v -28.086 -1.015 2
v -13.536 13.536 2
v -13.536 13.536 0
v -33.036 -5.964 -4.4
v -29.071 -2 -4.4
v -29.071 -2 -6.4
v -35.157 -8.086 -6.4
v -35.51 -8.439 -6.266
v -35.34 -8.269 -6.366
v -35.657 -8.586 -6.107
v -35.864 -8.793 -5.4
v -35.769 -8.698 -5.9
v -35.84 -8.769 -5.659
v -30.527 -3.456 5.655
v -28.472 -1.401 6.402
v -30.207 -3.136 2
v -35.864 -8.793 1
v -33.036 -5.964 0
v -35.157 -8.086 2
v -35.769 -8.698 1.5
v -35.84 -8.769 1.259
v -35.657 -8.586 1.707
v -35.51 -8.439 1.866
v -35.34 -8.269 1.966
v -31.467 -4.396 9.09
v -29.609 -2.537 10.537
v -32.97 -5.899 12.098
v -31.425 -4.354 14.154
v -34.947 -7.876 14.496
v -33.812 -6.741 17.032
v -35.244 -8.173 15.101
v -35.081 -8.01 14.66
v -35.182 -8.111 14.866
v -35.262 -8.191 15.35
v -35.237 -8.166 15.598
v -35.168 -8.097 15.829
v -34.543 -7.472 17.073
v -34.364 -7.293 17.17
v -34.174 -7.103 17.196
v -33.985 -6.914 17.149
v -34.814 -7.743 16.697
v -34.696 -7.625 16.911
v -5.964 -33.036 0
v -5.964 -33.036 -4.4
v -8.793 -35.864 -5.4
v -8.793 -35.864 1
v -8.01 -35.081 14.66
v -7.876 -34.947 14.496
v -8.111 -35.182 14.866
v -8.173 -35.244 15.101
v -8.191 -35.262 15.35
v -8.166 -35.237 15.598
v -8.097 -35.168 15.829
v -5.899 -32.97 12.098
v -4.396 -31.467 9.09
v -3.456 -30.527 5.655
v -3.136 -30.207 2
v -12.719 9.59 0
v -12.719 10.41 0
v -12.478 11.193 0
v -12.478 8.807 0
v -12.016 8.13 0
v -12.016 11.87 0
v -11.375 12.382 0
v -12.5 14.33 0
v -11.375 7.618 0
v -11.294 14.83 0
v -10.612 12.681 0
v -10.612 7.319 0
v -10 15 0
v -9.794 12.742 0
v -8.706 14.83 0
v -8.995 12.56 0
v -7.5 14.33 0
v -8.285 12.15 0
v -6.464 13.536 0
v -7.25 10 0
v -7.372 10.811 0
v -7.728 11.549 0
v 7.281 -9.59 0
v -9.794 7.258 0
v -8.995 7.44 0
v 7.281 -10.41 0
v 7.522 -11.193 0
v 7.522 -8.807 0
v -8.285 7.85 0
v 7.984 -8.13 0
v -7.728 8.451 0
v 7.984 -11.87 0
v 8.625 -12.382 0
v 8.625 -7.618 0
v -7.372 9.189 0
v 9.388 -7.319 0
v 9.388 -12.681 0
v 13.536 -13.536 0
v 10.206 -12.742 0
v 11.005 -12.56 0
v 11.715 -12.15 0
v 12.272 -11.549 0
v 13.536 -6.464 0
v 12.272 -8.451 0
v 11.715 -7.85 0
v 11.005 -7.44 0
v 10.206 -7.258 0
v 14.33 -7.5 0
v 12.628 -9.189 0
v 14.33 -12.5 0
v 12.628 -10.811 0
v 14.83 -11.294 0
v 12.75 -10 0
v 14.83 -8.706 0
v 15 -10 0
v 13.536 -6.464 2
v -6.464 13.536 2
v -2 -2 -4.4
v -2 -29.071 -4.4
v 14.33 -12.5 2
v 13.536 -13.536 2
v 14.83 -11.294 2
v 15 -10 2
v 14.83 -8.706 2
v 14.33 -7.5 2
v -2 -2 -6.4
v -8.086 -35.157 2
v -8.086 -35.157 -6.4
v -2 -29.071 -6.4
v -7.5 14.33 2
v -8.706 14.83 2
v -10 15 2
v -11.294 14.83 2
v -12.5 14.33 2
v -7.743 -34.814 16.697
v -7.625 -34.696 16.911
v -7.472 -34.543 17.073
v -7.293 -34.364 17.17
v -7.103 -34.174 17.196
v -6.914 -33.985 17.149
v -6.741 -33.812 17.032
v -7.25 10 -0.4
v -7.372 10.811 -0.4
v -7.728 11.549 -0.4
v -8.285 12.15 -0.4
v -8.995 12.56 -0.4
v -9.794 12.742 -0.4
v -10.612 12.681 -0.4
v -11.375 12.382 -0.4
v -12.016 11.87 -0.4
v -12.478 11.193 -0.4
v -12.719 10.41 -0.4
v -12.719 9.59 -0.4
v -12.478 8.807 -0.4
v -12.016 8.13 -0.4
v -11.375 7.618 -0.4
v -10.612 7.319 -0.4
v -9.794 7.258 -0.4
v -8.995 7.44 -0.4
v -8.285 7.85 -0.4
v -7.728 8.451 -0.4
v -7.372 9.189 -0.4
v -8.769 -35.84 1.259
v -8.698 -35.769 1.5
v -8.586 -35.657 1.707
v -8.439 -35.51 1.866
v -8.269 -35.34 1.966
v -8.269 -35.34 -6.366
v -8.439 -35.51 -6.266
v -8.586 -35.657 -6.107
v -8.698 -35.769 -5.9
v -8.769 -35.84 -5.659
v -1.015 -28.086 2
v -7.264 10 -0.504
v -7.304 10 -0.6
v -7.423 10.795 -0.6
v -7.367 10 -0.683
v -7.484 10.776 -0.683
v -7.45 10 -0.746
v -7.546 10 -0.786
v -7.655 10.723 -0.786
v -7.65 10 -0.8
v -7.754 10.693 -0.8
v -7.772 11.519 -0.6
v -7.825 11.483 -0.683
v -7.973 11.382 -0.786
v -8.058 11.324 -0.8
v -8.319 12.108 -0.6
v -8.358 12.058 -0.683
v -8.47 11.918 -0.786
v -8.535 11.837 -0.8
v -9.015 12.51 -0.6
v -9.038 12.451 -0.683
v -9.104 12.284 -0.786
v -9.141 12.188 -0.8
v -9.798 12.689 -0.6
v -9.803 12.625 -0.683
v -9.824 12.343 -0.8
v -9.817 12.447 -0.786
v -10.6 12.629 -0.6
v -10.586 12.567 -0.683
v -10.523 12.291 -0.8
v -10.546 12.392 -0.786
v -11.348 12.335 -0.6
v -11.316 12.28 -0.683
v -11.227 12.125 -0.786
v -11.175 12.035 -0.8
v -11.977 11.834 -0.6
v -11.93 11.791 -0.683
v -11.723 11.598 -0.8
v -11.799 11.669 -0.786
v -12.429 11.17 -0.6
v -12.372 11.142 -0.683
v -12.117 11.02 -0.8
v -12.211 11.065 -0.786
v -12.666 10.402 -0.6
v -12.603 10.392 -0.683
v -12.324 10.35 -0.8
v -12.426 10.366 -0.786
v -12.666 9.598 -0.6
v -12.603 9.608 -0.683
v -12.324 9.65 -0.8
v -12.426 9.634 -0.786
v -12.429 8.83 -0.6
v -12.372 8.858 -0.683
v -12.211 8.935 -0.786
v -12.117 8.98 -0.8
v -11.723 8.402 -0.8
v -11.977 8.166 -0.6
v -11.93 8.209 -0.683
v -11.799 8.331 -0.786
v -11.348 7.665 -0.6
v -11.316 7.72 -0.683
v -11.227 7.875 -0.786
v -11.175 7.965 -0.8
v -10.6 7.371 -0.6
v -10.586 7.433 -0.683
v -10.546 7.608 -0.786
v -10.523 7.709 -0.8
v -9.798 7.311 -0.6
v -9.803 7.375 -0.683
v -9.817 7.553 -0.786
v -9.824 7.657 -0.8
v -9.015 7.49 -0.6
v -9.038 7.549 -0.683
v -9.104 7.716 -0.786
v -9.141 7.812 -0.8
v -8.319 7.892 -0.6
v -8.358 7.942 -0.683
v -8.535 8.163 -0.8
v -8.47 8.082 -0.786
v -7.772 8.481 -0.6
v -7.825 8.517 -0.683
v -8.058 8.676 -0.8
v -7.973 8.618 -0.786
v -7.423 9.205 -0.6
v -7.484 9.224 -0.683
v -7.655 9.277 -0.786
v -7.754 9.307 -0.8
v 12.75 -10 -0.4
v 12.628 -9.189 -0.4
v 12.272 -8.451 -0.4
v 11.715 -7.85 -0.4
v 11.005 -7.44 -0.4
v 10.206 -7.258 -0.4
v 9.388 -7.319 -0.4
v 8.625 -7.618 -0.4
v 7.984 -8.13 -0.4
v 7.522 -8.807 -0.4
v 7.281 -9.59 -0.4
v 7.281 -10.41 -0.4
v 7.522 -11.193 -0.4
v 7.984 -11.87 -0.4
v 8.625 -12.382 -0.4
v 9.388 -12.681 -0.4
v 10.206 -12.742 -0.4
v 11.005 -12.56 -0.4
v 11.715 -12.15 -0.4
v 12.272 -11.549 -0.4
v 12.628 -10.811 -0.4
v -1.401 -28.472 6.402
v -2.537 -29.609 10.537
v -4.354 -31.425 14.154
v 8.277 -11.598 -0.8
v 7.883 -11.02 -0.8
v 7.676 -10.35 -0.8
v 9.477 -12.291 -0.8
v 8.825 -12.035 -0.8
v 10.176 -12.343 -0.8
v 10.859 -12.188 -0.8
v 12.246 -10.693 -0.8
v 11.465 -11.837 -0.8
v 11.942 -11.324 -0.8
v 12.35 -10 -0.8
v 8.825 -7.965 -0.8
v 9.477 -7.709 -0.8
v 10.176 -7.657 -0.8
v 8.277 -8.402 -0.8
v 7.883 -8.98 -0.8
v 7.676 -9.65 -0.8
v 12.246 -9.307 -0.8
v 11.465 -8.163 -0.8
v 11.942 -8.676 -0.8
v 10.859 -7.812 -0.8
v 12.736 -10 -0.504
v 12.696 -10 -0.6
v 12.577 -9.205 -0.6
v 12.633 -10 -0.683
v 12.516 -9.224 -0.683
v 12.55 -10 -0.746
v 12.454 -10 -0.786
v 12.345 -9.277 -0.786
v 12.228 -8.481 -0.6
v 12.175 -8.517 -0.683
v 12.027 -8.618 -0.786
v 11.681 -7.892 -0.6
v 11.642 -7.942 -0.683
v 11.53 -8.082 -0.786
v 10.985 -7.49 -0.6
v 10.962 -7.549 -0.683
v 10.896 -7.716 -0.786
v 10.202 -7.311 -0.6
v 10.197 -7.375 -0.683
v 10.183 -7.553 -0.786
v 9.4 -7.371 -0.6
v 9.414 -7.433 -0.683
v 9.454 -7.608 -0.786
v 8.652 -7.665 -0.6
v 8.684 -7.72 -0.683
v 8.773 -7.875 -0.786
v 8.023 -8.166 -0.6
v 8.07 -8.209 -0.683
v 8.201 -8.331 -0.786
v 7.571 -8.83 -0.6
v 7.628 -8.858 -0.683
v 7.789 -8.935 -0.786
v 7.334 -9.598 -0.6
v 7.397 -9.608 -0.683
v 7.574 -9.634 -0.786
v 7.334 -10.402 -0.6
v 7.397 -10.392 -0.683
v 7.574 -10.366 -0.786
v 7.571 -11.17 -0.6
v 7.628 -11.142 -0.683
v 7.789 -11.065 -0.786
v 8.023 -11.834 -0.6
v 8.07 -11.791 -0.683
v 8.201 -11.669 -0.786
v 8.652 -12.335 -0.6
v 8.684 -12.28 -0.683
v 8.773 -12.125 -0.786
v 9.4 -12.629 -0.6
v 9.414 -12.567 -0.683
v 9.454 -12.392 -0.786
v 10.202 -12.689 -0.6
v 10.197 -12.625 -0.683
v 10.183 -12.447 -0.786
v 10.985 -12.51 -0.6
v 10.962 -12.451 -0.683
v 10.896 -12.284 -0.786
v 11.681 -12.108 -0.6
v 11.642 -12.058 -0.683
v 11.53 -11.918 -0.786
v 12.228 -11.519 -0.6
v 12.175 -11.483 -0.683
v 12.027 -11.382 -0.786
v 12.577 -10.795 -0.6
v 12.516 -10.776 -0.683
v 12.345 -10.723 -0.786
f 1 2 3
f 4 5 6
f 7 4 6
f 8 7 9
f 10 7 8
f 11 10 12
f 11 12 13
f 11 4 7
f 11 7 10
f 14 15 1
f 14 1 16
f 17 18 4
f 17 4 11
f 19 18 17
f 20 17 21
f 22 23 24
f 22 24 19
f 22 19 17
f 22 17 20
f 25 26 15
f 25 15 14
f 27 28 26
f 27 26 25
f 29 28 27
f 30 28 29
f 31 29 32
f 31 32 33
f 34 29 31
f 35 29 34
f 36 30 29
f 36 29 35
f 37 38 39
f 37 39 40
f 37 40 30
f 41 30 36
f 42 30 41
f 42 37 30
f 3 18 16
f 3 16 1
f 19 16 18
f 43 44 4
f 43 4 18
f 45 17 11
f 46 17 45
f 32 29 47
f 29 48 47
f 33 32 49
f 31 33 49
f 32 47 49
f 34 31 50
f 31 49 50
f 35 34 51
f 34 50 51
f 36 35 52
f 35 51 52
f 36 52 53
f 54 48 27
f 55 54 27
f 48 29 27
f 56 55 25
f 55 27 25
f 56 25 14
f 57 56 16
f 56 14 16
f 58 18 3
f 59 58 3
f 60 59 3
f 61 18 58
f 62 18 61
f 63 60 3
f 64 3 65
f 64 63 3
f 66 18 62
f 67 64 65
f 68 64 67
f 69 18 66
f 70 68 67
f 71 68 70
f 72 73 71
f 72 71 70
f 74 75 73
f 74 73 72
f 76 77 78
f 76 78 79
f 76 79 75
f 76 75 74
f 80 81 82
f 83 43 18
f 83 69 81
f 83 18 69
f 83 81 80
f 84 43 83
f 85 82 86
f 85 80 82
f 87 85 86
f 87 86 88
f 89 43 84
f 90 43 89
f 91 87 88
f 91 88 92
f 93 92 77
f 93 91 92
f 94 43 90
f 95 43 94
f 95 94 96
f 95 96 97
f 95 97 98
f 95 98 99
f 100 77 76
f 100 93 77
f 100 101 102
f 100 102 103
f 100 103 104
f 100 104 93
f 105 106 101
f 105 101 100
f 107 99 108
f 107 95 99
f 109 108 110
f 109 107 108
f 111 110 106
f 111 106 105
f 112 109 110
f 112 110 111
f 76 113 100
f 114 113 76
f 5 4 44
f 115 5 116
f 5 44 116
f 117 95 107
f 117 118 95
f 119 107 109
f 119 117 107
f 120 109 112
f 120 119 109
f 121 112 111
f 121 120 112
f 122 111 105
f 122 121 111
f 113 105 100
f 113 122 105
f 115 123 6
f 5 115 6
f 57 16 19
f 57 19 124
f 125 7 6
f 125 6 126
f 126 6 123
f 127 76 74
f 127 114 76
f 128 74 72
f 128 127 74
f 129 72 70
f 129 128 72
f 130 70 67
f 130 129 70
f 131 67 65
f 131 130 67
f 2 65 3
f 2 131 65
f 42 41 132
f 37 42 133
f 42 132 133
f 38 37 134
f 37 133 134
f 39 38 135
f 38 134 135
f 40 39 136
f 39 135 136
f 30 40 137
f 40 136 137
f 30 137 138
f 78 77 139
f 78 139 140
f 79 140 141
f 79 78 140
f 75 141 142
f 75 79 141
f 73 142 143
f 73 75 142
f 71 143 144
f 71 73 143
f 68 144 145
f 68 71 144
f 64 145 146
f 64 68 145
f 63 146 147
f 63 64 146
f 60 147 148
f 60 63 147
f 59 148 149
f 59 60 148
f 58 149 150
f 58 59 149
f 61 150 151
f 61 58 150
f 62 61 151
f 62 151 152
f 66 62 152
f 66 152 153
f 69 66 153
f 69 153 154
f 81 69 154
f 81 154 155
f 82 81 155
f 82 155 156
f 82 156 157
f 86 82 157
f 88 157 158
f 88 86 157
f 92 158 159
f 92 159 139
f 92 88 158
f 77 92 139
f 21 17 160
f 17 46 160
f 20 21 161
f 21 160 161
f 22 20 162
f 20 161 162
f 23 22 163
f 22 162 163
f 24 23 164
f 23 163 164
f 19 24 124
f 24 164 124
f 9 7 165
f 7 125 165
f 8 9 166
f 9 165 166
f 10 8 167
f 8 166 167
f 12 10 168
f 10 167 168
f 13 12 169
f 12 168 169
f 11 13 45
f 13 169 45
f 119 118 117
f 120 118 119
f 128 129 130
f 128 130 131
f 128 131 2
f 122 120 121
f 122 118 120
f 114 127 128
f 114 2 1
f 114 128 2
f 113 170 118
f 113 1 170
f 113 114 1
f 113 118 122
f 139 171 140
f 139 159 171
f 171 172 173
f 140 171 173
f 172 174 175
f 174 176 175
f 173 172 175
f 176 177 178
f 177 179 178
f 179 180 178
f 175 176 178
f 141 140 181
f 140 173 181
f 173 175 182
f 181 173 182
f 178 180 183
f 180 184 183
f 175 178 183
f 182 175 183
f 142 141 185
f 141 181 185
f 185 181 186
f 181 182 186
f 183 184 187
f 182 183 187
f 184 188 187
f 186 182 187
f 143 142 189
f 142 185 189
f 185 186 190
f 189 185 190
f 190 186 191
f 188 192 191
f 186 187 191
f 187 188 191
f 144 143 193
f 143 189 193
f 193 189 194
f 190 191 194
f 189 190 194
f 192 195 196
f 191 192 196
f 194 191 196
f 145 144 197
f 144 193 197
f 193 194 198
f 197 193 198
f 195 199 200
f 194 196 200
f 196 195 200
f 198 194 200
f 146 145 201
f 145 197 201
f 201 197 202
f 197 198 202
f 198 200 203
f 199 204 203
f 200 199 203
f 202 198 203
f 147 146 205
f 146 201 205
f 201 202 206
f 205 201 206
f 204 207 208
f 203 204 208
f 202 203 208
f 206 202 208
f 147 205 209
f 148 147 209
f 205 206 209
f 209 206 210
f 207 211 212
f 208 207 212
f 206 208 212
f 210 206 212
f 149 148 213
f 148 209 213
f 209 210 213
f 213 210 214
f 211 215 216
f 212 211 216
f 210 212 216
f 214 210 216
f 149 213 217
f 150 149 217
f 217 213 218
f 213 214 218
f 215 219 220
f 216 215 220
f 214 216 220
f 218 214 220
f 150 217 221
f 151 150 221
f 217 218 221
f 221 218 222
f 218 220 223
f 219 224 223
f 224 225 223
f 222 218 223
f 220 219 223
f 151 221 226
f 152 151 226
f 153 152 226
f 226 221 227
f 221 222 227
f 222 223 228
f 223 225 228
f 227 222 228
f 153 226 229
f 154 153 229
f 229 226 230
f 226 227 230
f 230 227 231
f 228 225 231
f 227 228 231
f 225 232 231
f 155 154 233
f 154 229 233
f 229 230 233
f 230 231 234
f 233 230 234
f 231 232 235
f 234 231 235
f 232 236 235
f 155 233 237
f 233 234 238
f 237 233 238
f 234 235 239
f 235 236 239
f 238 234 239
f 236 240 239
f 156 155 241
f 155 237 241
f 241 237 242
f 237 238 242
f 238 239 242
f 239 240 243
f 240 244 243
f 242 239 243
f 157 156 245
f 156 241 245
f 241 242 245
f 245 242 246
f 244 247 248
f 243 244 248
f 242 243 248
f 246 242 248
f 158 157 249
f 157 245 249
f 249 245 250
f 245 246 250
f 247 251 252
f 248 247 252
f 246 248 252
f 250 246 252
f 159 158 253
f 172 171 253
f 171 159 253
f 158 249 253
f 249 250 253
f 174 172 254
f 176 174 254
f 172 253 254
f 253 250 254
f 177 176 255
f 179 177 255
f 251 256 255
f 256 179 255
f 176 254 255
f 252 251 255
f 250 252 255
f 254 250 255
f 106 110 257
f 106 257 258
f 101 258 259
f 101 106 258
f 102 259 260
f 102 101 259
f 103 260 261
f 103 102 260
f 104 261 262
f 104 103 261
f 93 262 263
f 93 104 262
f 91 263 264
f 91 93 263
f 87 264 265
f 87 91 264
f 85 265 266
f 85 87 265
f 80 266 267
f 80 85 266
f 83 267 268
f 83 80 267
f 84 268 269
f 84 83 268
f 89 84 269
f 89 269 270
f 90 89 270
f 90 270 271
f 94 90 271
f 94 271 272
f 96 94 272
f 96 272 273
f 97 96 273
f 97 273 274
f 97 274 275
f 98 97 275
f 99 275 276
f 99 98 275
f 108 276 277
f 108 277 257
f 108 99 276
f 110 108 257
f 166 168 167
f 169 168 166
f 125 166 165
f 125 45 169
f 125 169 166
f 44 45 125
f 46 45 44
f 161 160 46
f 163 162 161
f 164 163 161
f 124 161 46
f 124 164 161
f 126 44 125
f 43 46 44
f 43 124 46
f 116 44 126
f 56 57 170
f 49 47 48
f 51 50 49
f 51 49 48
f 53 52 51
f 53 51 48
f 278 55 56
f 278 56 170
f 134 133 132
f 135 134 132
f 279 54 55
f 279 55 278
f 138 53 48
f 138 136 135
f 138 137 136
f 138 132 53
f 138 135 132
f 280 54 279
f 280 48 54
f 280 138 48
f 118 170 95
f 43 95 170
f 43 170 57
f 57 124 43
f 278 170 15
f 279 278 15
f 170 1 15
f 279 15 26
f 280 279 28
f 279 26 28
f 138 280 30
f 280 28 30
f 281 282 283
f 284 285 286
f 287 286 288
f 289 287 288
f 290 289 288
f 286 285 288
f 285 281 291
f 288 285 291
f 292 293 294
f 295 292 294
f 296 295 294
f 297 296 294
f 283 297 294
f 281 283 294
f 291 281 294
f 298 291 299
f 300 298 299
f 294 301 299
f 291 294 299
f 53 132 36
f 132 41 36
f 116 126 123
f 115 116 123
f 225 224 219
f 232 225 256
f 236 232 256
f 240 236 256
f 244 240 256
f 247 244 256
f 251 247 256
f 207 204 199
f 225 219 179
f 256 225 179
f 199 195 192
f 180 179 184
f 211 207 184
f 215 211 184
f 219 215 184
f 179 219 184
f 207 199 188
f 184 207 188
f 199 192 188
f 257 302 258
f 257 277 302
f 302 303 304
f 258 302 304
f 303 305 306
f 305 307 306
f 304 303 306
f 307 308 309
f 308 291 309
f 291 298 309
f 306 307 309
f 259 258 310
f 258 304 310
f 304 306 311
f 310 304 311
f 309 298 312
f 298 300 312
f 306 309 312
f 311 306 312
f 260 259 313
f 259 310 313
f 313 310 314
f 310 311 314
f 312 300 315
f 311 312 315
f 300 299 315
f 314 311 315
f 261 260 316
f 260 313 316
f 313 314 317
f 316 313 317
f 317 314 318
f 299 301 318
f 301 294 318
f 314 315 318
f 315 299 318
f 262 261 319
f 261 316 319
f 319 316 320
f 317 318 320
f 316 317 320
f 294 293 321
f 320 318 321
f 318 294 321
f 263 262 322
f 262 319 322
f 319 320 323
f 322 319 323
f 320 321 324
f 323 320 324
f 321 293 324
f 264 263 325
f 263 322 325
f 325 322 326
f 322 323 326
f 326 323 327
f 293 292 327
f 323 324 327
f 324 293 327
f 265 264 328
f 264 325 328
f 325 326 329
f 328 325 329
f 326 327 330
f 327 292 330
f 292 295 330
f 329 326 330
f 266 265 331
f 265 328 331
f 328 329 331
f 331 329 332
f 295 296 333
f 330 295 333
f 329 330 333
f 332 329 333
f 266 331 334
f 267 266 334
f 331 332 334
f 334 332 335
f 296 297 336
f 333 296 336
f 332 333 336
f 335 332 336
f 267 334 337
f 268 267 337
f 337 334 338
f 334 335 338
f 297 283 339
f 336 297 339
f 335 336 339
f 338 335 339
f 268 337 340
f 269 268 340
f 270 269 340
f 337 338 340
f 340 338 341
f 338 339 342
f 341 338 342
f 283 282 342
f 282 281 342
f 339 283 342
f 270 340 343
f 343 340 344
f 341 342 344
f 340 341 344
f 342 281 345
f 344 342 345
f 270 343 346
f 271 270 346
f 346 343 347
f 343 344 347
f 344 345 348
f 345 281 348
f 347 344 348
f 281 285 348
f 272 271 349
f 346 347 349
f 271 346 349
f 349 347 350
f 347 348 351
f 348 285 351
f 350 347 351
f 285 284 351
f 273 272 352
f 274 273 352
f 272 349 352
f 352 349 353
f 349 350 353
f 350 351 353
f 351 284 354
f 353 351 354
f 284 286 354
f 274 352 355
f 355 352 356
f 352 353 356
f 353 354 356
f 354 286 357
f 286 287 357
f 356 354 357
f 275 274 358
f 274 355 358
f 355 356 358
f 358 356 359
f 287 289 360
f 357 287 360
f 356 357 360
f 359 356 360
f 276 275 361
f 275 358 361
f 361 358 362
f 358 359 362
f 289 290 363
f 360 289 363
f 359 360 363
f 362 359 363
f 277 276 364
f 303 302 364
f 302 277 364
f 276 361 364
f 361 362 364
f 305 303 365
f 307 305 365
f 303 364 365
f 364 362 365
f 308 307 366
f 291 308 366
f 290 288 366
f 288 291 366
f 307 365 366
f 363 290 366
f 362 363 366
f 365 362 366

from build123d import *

# Parameters (mm, degrees)
F2_DEPTH      = 2
F2_DEPTH_BACK = 6.4
F3_W          = 32.5771644663
F3_H          = 4.4
F4_DEPTH      = 56.5738534806
F7_DEPTH      = 19.1421356237
F7_DEPTH_BACK = 19.1421356237
F9_DEPTH      = 2
F0_R          = 2.75
F10_DEPTH     = 0.8
F11_R         = 0.4
F12_R         = 1
F13_R         = 5


with BuildPart() as f2:
    # F1 (on Top) → F2 (new body, two sides)
    with BuildSketch(Plane.XY) as f2_sk:
        Polygon((-8.7928932188, -35.8639610307), (17.0710678119, -10), (-10, 17.0710678119), (-35.8639610307, -8.7928932188), align=None)
    extrude(amount=F2_DEPTH)
    extrude(f2_sk.sketch, amount=-F2_DEPTH_BACK)

    # F3 (on face) → F4 (cut, through all)
    with BuildSketch(Plane(origin=(13.5355339059, -13.5355339059, 0), x_dir=(0.7071067812, 0.7071067812, 0), z_dir=(0.7071067812, -0.7071067812, 0))):
        with Locations((-11.2885822331, -2.2)):
            Rectangle(F3_W, F3_H)
    extrude(amount=-F4_DEPTH, mode=Mode.SUBTRACT)

    # F6 (on face) → F7 (join, two sides)
    with BuildSketch(Plane(origin=(0, 0, 0), x_dir=(0.7071067812, 0.7071067812, 0), z_dir=(0.7071067812, -0.7071067812, 0))) as f7_sk:
        with BuildLine():
            Line((-23.5771644663, 2), (-20.5771644663, 2))
            ThreePointArc((-20.5771644663, 2), (-22.9887071982, 11), (-29.5771644663, 17.5884572681))
            Line((-29.5771644663, 17.5884572681), (-31.0771644663, 14.9903810568))
            ThreePointArc((-31.0771644663, 14.9903810568), (-25.5867834095, 9.5), (-23.5771644663, 2))
        make_face()
    extrude(amount=-F7_DEPTH)
    extrude(f7_sk.sketch, amount=F7_DEPTH_BACK)

    # F8 (on face) → F9 (cut, through all)
    with BuildSketch(Plane(origin=(0, 0, -6.4), x_dir=(1, 0, 0), z_dir=(0, 0, -1))):
        Polygon((17.0710678119, 10), (-2, 29.0710678119), (-2, 2), (-29.0710678119, 2), (-10, -17.0710678119), align=None)
    extrude(amount=-F9_DEPTH, mode=Mode.SUBTRACT)

    # F0 (on Top) → F10 (join)
    with BuildSketch(Plane.XY):
        with Locations((10, -10)):
            Circle(F0_R)
        with Locations((-10, 10)):
            Circle(F0_R)
    extrude(amount=-F10_DEPTH)

    # F11
    f11_edges = [f2.edges().sort_by_distance(p)[0] for p in [
        (7.25, -10, -0.8),
        (-12.75, 10, -0.8),
    ]]
    fillet(f11_edges, radius=F11_R)

    # F12
    f12_edges = [f2.edges().sort_by_distance(p)[0] for p in [
        (-21.974874, -21.974874, 14.990381),
        (-20.914214, -20.914214, 17.588457),
        (-22.328427, -22.328427, 2),
        (-22.328427, -22.328427, -6.4),
    ]]
    fillet(f12_edges, radius=F12_R)

    # F13
    f13_edges = [f2.edges().sort_by_distance(p)[0] for p in [
        (17.071068, -10, 1),
        (-10, 17.071068, 1),
    ]]
    fillet(f13_edges, radius=F13_R)


solid = f2.part
